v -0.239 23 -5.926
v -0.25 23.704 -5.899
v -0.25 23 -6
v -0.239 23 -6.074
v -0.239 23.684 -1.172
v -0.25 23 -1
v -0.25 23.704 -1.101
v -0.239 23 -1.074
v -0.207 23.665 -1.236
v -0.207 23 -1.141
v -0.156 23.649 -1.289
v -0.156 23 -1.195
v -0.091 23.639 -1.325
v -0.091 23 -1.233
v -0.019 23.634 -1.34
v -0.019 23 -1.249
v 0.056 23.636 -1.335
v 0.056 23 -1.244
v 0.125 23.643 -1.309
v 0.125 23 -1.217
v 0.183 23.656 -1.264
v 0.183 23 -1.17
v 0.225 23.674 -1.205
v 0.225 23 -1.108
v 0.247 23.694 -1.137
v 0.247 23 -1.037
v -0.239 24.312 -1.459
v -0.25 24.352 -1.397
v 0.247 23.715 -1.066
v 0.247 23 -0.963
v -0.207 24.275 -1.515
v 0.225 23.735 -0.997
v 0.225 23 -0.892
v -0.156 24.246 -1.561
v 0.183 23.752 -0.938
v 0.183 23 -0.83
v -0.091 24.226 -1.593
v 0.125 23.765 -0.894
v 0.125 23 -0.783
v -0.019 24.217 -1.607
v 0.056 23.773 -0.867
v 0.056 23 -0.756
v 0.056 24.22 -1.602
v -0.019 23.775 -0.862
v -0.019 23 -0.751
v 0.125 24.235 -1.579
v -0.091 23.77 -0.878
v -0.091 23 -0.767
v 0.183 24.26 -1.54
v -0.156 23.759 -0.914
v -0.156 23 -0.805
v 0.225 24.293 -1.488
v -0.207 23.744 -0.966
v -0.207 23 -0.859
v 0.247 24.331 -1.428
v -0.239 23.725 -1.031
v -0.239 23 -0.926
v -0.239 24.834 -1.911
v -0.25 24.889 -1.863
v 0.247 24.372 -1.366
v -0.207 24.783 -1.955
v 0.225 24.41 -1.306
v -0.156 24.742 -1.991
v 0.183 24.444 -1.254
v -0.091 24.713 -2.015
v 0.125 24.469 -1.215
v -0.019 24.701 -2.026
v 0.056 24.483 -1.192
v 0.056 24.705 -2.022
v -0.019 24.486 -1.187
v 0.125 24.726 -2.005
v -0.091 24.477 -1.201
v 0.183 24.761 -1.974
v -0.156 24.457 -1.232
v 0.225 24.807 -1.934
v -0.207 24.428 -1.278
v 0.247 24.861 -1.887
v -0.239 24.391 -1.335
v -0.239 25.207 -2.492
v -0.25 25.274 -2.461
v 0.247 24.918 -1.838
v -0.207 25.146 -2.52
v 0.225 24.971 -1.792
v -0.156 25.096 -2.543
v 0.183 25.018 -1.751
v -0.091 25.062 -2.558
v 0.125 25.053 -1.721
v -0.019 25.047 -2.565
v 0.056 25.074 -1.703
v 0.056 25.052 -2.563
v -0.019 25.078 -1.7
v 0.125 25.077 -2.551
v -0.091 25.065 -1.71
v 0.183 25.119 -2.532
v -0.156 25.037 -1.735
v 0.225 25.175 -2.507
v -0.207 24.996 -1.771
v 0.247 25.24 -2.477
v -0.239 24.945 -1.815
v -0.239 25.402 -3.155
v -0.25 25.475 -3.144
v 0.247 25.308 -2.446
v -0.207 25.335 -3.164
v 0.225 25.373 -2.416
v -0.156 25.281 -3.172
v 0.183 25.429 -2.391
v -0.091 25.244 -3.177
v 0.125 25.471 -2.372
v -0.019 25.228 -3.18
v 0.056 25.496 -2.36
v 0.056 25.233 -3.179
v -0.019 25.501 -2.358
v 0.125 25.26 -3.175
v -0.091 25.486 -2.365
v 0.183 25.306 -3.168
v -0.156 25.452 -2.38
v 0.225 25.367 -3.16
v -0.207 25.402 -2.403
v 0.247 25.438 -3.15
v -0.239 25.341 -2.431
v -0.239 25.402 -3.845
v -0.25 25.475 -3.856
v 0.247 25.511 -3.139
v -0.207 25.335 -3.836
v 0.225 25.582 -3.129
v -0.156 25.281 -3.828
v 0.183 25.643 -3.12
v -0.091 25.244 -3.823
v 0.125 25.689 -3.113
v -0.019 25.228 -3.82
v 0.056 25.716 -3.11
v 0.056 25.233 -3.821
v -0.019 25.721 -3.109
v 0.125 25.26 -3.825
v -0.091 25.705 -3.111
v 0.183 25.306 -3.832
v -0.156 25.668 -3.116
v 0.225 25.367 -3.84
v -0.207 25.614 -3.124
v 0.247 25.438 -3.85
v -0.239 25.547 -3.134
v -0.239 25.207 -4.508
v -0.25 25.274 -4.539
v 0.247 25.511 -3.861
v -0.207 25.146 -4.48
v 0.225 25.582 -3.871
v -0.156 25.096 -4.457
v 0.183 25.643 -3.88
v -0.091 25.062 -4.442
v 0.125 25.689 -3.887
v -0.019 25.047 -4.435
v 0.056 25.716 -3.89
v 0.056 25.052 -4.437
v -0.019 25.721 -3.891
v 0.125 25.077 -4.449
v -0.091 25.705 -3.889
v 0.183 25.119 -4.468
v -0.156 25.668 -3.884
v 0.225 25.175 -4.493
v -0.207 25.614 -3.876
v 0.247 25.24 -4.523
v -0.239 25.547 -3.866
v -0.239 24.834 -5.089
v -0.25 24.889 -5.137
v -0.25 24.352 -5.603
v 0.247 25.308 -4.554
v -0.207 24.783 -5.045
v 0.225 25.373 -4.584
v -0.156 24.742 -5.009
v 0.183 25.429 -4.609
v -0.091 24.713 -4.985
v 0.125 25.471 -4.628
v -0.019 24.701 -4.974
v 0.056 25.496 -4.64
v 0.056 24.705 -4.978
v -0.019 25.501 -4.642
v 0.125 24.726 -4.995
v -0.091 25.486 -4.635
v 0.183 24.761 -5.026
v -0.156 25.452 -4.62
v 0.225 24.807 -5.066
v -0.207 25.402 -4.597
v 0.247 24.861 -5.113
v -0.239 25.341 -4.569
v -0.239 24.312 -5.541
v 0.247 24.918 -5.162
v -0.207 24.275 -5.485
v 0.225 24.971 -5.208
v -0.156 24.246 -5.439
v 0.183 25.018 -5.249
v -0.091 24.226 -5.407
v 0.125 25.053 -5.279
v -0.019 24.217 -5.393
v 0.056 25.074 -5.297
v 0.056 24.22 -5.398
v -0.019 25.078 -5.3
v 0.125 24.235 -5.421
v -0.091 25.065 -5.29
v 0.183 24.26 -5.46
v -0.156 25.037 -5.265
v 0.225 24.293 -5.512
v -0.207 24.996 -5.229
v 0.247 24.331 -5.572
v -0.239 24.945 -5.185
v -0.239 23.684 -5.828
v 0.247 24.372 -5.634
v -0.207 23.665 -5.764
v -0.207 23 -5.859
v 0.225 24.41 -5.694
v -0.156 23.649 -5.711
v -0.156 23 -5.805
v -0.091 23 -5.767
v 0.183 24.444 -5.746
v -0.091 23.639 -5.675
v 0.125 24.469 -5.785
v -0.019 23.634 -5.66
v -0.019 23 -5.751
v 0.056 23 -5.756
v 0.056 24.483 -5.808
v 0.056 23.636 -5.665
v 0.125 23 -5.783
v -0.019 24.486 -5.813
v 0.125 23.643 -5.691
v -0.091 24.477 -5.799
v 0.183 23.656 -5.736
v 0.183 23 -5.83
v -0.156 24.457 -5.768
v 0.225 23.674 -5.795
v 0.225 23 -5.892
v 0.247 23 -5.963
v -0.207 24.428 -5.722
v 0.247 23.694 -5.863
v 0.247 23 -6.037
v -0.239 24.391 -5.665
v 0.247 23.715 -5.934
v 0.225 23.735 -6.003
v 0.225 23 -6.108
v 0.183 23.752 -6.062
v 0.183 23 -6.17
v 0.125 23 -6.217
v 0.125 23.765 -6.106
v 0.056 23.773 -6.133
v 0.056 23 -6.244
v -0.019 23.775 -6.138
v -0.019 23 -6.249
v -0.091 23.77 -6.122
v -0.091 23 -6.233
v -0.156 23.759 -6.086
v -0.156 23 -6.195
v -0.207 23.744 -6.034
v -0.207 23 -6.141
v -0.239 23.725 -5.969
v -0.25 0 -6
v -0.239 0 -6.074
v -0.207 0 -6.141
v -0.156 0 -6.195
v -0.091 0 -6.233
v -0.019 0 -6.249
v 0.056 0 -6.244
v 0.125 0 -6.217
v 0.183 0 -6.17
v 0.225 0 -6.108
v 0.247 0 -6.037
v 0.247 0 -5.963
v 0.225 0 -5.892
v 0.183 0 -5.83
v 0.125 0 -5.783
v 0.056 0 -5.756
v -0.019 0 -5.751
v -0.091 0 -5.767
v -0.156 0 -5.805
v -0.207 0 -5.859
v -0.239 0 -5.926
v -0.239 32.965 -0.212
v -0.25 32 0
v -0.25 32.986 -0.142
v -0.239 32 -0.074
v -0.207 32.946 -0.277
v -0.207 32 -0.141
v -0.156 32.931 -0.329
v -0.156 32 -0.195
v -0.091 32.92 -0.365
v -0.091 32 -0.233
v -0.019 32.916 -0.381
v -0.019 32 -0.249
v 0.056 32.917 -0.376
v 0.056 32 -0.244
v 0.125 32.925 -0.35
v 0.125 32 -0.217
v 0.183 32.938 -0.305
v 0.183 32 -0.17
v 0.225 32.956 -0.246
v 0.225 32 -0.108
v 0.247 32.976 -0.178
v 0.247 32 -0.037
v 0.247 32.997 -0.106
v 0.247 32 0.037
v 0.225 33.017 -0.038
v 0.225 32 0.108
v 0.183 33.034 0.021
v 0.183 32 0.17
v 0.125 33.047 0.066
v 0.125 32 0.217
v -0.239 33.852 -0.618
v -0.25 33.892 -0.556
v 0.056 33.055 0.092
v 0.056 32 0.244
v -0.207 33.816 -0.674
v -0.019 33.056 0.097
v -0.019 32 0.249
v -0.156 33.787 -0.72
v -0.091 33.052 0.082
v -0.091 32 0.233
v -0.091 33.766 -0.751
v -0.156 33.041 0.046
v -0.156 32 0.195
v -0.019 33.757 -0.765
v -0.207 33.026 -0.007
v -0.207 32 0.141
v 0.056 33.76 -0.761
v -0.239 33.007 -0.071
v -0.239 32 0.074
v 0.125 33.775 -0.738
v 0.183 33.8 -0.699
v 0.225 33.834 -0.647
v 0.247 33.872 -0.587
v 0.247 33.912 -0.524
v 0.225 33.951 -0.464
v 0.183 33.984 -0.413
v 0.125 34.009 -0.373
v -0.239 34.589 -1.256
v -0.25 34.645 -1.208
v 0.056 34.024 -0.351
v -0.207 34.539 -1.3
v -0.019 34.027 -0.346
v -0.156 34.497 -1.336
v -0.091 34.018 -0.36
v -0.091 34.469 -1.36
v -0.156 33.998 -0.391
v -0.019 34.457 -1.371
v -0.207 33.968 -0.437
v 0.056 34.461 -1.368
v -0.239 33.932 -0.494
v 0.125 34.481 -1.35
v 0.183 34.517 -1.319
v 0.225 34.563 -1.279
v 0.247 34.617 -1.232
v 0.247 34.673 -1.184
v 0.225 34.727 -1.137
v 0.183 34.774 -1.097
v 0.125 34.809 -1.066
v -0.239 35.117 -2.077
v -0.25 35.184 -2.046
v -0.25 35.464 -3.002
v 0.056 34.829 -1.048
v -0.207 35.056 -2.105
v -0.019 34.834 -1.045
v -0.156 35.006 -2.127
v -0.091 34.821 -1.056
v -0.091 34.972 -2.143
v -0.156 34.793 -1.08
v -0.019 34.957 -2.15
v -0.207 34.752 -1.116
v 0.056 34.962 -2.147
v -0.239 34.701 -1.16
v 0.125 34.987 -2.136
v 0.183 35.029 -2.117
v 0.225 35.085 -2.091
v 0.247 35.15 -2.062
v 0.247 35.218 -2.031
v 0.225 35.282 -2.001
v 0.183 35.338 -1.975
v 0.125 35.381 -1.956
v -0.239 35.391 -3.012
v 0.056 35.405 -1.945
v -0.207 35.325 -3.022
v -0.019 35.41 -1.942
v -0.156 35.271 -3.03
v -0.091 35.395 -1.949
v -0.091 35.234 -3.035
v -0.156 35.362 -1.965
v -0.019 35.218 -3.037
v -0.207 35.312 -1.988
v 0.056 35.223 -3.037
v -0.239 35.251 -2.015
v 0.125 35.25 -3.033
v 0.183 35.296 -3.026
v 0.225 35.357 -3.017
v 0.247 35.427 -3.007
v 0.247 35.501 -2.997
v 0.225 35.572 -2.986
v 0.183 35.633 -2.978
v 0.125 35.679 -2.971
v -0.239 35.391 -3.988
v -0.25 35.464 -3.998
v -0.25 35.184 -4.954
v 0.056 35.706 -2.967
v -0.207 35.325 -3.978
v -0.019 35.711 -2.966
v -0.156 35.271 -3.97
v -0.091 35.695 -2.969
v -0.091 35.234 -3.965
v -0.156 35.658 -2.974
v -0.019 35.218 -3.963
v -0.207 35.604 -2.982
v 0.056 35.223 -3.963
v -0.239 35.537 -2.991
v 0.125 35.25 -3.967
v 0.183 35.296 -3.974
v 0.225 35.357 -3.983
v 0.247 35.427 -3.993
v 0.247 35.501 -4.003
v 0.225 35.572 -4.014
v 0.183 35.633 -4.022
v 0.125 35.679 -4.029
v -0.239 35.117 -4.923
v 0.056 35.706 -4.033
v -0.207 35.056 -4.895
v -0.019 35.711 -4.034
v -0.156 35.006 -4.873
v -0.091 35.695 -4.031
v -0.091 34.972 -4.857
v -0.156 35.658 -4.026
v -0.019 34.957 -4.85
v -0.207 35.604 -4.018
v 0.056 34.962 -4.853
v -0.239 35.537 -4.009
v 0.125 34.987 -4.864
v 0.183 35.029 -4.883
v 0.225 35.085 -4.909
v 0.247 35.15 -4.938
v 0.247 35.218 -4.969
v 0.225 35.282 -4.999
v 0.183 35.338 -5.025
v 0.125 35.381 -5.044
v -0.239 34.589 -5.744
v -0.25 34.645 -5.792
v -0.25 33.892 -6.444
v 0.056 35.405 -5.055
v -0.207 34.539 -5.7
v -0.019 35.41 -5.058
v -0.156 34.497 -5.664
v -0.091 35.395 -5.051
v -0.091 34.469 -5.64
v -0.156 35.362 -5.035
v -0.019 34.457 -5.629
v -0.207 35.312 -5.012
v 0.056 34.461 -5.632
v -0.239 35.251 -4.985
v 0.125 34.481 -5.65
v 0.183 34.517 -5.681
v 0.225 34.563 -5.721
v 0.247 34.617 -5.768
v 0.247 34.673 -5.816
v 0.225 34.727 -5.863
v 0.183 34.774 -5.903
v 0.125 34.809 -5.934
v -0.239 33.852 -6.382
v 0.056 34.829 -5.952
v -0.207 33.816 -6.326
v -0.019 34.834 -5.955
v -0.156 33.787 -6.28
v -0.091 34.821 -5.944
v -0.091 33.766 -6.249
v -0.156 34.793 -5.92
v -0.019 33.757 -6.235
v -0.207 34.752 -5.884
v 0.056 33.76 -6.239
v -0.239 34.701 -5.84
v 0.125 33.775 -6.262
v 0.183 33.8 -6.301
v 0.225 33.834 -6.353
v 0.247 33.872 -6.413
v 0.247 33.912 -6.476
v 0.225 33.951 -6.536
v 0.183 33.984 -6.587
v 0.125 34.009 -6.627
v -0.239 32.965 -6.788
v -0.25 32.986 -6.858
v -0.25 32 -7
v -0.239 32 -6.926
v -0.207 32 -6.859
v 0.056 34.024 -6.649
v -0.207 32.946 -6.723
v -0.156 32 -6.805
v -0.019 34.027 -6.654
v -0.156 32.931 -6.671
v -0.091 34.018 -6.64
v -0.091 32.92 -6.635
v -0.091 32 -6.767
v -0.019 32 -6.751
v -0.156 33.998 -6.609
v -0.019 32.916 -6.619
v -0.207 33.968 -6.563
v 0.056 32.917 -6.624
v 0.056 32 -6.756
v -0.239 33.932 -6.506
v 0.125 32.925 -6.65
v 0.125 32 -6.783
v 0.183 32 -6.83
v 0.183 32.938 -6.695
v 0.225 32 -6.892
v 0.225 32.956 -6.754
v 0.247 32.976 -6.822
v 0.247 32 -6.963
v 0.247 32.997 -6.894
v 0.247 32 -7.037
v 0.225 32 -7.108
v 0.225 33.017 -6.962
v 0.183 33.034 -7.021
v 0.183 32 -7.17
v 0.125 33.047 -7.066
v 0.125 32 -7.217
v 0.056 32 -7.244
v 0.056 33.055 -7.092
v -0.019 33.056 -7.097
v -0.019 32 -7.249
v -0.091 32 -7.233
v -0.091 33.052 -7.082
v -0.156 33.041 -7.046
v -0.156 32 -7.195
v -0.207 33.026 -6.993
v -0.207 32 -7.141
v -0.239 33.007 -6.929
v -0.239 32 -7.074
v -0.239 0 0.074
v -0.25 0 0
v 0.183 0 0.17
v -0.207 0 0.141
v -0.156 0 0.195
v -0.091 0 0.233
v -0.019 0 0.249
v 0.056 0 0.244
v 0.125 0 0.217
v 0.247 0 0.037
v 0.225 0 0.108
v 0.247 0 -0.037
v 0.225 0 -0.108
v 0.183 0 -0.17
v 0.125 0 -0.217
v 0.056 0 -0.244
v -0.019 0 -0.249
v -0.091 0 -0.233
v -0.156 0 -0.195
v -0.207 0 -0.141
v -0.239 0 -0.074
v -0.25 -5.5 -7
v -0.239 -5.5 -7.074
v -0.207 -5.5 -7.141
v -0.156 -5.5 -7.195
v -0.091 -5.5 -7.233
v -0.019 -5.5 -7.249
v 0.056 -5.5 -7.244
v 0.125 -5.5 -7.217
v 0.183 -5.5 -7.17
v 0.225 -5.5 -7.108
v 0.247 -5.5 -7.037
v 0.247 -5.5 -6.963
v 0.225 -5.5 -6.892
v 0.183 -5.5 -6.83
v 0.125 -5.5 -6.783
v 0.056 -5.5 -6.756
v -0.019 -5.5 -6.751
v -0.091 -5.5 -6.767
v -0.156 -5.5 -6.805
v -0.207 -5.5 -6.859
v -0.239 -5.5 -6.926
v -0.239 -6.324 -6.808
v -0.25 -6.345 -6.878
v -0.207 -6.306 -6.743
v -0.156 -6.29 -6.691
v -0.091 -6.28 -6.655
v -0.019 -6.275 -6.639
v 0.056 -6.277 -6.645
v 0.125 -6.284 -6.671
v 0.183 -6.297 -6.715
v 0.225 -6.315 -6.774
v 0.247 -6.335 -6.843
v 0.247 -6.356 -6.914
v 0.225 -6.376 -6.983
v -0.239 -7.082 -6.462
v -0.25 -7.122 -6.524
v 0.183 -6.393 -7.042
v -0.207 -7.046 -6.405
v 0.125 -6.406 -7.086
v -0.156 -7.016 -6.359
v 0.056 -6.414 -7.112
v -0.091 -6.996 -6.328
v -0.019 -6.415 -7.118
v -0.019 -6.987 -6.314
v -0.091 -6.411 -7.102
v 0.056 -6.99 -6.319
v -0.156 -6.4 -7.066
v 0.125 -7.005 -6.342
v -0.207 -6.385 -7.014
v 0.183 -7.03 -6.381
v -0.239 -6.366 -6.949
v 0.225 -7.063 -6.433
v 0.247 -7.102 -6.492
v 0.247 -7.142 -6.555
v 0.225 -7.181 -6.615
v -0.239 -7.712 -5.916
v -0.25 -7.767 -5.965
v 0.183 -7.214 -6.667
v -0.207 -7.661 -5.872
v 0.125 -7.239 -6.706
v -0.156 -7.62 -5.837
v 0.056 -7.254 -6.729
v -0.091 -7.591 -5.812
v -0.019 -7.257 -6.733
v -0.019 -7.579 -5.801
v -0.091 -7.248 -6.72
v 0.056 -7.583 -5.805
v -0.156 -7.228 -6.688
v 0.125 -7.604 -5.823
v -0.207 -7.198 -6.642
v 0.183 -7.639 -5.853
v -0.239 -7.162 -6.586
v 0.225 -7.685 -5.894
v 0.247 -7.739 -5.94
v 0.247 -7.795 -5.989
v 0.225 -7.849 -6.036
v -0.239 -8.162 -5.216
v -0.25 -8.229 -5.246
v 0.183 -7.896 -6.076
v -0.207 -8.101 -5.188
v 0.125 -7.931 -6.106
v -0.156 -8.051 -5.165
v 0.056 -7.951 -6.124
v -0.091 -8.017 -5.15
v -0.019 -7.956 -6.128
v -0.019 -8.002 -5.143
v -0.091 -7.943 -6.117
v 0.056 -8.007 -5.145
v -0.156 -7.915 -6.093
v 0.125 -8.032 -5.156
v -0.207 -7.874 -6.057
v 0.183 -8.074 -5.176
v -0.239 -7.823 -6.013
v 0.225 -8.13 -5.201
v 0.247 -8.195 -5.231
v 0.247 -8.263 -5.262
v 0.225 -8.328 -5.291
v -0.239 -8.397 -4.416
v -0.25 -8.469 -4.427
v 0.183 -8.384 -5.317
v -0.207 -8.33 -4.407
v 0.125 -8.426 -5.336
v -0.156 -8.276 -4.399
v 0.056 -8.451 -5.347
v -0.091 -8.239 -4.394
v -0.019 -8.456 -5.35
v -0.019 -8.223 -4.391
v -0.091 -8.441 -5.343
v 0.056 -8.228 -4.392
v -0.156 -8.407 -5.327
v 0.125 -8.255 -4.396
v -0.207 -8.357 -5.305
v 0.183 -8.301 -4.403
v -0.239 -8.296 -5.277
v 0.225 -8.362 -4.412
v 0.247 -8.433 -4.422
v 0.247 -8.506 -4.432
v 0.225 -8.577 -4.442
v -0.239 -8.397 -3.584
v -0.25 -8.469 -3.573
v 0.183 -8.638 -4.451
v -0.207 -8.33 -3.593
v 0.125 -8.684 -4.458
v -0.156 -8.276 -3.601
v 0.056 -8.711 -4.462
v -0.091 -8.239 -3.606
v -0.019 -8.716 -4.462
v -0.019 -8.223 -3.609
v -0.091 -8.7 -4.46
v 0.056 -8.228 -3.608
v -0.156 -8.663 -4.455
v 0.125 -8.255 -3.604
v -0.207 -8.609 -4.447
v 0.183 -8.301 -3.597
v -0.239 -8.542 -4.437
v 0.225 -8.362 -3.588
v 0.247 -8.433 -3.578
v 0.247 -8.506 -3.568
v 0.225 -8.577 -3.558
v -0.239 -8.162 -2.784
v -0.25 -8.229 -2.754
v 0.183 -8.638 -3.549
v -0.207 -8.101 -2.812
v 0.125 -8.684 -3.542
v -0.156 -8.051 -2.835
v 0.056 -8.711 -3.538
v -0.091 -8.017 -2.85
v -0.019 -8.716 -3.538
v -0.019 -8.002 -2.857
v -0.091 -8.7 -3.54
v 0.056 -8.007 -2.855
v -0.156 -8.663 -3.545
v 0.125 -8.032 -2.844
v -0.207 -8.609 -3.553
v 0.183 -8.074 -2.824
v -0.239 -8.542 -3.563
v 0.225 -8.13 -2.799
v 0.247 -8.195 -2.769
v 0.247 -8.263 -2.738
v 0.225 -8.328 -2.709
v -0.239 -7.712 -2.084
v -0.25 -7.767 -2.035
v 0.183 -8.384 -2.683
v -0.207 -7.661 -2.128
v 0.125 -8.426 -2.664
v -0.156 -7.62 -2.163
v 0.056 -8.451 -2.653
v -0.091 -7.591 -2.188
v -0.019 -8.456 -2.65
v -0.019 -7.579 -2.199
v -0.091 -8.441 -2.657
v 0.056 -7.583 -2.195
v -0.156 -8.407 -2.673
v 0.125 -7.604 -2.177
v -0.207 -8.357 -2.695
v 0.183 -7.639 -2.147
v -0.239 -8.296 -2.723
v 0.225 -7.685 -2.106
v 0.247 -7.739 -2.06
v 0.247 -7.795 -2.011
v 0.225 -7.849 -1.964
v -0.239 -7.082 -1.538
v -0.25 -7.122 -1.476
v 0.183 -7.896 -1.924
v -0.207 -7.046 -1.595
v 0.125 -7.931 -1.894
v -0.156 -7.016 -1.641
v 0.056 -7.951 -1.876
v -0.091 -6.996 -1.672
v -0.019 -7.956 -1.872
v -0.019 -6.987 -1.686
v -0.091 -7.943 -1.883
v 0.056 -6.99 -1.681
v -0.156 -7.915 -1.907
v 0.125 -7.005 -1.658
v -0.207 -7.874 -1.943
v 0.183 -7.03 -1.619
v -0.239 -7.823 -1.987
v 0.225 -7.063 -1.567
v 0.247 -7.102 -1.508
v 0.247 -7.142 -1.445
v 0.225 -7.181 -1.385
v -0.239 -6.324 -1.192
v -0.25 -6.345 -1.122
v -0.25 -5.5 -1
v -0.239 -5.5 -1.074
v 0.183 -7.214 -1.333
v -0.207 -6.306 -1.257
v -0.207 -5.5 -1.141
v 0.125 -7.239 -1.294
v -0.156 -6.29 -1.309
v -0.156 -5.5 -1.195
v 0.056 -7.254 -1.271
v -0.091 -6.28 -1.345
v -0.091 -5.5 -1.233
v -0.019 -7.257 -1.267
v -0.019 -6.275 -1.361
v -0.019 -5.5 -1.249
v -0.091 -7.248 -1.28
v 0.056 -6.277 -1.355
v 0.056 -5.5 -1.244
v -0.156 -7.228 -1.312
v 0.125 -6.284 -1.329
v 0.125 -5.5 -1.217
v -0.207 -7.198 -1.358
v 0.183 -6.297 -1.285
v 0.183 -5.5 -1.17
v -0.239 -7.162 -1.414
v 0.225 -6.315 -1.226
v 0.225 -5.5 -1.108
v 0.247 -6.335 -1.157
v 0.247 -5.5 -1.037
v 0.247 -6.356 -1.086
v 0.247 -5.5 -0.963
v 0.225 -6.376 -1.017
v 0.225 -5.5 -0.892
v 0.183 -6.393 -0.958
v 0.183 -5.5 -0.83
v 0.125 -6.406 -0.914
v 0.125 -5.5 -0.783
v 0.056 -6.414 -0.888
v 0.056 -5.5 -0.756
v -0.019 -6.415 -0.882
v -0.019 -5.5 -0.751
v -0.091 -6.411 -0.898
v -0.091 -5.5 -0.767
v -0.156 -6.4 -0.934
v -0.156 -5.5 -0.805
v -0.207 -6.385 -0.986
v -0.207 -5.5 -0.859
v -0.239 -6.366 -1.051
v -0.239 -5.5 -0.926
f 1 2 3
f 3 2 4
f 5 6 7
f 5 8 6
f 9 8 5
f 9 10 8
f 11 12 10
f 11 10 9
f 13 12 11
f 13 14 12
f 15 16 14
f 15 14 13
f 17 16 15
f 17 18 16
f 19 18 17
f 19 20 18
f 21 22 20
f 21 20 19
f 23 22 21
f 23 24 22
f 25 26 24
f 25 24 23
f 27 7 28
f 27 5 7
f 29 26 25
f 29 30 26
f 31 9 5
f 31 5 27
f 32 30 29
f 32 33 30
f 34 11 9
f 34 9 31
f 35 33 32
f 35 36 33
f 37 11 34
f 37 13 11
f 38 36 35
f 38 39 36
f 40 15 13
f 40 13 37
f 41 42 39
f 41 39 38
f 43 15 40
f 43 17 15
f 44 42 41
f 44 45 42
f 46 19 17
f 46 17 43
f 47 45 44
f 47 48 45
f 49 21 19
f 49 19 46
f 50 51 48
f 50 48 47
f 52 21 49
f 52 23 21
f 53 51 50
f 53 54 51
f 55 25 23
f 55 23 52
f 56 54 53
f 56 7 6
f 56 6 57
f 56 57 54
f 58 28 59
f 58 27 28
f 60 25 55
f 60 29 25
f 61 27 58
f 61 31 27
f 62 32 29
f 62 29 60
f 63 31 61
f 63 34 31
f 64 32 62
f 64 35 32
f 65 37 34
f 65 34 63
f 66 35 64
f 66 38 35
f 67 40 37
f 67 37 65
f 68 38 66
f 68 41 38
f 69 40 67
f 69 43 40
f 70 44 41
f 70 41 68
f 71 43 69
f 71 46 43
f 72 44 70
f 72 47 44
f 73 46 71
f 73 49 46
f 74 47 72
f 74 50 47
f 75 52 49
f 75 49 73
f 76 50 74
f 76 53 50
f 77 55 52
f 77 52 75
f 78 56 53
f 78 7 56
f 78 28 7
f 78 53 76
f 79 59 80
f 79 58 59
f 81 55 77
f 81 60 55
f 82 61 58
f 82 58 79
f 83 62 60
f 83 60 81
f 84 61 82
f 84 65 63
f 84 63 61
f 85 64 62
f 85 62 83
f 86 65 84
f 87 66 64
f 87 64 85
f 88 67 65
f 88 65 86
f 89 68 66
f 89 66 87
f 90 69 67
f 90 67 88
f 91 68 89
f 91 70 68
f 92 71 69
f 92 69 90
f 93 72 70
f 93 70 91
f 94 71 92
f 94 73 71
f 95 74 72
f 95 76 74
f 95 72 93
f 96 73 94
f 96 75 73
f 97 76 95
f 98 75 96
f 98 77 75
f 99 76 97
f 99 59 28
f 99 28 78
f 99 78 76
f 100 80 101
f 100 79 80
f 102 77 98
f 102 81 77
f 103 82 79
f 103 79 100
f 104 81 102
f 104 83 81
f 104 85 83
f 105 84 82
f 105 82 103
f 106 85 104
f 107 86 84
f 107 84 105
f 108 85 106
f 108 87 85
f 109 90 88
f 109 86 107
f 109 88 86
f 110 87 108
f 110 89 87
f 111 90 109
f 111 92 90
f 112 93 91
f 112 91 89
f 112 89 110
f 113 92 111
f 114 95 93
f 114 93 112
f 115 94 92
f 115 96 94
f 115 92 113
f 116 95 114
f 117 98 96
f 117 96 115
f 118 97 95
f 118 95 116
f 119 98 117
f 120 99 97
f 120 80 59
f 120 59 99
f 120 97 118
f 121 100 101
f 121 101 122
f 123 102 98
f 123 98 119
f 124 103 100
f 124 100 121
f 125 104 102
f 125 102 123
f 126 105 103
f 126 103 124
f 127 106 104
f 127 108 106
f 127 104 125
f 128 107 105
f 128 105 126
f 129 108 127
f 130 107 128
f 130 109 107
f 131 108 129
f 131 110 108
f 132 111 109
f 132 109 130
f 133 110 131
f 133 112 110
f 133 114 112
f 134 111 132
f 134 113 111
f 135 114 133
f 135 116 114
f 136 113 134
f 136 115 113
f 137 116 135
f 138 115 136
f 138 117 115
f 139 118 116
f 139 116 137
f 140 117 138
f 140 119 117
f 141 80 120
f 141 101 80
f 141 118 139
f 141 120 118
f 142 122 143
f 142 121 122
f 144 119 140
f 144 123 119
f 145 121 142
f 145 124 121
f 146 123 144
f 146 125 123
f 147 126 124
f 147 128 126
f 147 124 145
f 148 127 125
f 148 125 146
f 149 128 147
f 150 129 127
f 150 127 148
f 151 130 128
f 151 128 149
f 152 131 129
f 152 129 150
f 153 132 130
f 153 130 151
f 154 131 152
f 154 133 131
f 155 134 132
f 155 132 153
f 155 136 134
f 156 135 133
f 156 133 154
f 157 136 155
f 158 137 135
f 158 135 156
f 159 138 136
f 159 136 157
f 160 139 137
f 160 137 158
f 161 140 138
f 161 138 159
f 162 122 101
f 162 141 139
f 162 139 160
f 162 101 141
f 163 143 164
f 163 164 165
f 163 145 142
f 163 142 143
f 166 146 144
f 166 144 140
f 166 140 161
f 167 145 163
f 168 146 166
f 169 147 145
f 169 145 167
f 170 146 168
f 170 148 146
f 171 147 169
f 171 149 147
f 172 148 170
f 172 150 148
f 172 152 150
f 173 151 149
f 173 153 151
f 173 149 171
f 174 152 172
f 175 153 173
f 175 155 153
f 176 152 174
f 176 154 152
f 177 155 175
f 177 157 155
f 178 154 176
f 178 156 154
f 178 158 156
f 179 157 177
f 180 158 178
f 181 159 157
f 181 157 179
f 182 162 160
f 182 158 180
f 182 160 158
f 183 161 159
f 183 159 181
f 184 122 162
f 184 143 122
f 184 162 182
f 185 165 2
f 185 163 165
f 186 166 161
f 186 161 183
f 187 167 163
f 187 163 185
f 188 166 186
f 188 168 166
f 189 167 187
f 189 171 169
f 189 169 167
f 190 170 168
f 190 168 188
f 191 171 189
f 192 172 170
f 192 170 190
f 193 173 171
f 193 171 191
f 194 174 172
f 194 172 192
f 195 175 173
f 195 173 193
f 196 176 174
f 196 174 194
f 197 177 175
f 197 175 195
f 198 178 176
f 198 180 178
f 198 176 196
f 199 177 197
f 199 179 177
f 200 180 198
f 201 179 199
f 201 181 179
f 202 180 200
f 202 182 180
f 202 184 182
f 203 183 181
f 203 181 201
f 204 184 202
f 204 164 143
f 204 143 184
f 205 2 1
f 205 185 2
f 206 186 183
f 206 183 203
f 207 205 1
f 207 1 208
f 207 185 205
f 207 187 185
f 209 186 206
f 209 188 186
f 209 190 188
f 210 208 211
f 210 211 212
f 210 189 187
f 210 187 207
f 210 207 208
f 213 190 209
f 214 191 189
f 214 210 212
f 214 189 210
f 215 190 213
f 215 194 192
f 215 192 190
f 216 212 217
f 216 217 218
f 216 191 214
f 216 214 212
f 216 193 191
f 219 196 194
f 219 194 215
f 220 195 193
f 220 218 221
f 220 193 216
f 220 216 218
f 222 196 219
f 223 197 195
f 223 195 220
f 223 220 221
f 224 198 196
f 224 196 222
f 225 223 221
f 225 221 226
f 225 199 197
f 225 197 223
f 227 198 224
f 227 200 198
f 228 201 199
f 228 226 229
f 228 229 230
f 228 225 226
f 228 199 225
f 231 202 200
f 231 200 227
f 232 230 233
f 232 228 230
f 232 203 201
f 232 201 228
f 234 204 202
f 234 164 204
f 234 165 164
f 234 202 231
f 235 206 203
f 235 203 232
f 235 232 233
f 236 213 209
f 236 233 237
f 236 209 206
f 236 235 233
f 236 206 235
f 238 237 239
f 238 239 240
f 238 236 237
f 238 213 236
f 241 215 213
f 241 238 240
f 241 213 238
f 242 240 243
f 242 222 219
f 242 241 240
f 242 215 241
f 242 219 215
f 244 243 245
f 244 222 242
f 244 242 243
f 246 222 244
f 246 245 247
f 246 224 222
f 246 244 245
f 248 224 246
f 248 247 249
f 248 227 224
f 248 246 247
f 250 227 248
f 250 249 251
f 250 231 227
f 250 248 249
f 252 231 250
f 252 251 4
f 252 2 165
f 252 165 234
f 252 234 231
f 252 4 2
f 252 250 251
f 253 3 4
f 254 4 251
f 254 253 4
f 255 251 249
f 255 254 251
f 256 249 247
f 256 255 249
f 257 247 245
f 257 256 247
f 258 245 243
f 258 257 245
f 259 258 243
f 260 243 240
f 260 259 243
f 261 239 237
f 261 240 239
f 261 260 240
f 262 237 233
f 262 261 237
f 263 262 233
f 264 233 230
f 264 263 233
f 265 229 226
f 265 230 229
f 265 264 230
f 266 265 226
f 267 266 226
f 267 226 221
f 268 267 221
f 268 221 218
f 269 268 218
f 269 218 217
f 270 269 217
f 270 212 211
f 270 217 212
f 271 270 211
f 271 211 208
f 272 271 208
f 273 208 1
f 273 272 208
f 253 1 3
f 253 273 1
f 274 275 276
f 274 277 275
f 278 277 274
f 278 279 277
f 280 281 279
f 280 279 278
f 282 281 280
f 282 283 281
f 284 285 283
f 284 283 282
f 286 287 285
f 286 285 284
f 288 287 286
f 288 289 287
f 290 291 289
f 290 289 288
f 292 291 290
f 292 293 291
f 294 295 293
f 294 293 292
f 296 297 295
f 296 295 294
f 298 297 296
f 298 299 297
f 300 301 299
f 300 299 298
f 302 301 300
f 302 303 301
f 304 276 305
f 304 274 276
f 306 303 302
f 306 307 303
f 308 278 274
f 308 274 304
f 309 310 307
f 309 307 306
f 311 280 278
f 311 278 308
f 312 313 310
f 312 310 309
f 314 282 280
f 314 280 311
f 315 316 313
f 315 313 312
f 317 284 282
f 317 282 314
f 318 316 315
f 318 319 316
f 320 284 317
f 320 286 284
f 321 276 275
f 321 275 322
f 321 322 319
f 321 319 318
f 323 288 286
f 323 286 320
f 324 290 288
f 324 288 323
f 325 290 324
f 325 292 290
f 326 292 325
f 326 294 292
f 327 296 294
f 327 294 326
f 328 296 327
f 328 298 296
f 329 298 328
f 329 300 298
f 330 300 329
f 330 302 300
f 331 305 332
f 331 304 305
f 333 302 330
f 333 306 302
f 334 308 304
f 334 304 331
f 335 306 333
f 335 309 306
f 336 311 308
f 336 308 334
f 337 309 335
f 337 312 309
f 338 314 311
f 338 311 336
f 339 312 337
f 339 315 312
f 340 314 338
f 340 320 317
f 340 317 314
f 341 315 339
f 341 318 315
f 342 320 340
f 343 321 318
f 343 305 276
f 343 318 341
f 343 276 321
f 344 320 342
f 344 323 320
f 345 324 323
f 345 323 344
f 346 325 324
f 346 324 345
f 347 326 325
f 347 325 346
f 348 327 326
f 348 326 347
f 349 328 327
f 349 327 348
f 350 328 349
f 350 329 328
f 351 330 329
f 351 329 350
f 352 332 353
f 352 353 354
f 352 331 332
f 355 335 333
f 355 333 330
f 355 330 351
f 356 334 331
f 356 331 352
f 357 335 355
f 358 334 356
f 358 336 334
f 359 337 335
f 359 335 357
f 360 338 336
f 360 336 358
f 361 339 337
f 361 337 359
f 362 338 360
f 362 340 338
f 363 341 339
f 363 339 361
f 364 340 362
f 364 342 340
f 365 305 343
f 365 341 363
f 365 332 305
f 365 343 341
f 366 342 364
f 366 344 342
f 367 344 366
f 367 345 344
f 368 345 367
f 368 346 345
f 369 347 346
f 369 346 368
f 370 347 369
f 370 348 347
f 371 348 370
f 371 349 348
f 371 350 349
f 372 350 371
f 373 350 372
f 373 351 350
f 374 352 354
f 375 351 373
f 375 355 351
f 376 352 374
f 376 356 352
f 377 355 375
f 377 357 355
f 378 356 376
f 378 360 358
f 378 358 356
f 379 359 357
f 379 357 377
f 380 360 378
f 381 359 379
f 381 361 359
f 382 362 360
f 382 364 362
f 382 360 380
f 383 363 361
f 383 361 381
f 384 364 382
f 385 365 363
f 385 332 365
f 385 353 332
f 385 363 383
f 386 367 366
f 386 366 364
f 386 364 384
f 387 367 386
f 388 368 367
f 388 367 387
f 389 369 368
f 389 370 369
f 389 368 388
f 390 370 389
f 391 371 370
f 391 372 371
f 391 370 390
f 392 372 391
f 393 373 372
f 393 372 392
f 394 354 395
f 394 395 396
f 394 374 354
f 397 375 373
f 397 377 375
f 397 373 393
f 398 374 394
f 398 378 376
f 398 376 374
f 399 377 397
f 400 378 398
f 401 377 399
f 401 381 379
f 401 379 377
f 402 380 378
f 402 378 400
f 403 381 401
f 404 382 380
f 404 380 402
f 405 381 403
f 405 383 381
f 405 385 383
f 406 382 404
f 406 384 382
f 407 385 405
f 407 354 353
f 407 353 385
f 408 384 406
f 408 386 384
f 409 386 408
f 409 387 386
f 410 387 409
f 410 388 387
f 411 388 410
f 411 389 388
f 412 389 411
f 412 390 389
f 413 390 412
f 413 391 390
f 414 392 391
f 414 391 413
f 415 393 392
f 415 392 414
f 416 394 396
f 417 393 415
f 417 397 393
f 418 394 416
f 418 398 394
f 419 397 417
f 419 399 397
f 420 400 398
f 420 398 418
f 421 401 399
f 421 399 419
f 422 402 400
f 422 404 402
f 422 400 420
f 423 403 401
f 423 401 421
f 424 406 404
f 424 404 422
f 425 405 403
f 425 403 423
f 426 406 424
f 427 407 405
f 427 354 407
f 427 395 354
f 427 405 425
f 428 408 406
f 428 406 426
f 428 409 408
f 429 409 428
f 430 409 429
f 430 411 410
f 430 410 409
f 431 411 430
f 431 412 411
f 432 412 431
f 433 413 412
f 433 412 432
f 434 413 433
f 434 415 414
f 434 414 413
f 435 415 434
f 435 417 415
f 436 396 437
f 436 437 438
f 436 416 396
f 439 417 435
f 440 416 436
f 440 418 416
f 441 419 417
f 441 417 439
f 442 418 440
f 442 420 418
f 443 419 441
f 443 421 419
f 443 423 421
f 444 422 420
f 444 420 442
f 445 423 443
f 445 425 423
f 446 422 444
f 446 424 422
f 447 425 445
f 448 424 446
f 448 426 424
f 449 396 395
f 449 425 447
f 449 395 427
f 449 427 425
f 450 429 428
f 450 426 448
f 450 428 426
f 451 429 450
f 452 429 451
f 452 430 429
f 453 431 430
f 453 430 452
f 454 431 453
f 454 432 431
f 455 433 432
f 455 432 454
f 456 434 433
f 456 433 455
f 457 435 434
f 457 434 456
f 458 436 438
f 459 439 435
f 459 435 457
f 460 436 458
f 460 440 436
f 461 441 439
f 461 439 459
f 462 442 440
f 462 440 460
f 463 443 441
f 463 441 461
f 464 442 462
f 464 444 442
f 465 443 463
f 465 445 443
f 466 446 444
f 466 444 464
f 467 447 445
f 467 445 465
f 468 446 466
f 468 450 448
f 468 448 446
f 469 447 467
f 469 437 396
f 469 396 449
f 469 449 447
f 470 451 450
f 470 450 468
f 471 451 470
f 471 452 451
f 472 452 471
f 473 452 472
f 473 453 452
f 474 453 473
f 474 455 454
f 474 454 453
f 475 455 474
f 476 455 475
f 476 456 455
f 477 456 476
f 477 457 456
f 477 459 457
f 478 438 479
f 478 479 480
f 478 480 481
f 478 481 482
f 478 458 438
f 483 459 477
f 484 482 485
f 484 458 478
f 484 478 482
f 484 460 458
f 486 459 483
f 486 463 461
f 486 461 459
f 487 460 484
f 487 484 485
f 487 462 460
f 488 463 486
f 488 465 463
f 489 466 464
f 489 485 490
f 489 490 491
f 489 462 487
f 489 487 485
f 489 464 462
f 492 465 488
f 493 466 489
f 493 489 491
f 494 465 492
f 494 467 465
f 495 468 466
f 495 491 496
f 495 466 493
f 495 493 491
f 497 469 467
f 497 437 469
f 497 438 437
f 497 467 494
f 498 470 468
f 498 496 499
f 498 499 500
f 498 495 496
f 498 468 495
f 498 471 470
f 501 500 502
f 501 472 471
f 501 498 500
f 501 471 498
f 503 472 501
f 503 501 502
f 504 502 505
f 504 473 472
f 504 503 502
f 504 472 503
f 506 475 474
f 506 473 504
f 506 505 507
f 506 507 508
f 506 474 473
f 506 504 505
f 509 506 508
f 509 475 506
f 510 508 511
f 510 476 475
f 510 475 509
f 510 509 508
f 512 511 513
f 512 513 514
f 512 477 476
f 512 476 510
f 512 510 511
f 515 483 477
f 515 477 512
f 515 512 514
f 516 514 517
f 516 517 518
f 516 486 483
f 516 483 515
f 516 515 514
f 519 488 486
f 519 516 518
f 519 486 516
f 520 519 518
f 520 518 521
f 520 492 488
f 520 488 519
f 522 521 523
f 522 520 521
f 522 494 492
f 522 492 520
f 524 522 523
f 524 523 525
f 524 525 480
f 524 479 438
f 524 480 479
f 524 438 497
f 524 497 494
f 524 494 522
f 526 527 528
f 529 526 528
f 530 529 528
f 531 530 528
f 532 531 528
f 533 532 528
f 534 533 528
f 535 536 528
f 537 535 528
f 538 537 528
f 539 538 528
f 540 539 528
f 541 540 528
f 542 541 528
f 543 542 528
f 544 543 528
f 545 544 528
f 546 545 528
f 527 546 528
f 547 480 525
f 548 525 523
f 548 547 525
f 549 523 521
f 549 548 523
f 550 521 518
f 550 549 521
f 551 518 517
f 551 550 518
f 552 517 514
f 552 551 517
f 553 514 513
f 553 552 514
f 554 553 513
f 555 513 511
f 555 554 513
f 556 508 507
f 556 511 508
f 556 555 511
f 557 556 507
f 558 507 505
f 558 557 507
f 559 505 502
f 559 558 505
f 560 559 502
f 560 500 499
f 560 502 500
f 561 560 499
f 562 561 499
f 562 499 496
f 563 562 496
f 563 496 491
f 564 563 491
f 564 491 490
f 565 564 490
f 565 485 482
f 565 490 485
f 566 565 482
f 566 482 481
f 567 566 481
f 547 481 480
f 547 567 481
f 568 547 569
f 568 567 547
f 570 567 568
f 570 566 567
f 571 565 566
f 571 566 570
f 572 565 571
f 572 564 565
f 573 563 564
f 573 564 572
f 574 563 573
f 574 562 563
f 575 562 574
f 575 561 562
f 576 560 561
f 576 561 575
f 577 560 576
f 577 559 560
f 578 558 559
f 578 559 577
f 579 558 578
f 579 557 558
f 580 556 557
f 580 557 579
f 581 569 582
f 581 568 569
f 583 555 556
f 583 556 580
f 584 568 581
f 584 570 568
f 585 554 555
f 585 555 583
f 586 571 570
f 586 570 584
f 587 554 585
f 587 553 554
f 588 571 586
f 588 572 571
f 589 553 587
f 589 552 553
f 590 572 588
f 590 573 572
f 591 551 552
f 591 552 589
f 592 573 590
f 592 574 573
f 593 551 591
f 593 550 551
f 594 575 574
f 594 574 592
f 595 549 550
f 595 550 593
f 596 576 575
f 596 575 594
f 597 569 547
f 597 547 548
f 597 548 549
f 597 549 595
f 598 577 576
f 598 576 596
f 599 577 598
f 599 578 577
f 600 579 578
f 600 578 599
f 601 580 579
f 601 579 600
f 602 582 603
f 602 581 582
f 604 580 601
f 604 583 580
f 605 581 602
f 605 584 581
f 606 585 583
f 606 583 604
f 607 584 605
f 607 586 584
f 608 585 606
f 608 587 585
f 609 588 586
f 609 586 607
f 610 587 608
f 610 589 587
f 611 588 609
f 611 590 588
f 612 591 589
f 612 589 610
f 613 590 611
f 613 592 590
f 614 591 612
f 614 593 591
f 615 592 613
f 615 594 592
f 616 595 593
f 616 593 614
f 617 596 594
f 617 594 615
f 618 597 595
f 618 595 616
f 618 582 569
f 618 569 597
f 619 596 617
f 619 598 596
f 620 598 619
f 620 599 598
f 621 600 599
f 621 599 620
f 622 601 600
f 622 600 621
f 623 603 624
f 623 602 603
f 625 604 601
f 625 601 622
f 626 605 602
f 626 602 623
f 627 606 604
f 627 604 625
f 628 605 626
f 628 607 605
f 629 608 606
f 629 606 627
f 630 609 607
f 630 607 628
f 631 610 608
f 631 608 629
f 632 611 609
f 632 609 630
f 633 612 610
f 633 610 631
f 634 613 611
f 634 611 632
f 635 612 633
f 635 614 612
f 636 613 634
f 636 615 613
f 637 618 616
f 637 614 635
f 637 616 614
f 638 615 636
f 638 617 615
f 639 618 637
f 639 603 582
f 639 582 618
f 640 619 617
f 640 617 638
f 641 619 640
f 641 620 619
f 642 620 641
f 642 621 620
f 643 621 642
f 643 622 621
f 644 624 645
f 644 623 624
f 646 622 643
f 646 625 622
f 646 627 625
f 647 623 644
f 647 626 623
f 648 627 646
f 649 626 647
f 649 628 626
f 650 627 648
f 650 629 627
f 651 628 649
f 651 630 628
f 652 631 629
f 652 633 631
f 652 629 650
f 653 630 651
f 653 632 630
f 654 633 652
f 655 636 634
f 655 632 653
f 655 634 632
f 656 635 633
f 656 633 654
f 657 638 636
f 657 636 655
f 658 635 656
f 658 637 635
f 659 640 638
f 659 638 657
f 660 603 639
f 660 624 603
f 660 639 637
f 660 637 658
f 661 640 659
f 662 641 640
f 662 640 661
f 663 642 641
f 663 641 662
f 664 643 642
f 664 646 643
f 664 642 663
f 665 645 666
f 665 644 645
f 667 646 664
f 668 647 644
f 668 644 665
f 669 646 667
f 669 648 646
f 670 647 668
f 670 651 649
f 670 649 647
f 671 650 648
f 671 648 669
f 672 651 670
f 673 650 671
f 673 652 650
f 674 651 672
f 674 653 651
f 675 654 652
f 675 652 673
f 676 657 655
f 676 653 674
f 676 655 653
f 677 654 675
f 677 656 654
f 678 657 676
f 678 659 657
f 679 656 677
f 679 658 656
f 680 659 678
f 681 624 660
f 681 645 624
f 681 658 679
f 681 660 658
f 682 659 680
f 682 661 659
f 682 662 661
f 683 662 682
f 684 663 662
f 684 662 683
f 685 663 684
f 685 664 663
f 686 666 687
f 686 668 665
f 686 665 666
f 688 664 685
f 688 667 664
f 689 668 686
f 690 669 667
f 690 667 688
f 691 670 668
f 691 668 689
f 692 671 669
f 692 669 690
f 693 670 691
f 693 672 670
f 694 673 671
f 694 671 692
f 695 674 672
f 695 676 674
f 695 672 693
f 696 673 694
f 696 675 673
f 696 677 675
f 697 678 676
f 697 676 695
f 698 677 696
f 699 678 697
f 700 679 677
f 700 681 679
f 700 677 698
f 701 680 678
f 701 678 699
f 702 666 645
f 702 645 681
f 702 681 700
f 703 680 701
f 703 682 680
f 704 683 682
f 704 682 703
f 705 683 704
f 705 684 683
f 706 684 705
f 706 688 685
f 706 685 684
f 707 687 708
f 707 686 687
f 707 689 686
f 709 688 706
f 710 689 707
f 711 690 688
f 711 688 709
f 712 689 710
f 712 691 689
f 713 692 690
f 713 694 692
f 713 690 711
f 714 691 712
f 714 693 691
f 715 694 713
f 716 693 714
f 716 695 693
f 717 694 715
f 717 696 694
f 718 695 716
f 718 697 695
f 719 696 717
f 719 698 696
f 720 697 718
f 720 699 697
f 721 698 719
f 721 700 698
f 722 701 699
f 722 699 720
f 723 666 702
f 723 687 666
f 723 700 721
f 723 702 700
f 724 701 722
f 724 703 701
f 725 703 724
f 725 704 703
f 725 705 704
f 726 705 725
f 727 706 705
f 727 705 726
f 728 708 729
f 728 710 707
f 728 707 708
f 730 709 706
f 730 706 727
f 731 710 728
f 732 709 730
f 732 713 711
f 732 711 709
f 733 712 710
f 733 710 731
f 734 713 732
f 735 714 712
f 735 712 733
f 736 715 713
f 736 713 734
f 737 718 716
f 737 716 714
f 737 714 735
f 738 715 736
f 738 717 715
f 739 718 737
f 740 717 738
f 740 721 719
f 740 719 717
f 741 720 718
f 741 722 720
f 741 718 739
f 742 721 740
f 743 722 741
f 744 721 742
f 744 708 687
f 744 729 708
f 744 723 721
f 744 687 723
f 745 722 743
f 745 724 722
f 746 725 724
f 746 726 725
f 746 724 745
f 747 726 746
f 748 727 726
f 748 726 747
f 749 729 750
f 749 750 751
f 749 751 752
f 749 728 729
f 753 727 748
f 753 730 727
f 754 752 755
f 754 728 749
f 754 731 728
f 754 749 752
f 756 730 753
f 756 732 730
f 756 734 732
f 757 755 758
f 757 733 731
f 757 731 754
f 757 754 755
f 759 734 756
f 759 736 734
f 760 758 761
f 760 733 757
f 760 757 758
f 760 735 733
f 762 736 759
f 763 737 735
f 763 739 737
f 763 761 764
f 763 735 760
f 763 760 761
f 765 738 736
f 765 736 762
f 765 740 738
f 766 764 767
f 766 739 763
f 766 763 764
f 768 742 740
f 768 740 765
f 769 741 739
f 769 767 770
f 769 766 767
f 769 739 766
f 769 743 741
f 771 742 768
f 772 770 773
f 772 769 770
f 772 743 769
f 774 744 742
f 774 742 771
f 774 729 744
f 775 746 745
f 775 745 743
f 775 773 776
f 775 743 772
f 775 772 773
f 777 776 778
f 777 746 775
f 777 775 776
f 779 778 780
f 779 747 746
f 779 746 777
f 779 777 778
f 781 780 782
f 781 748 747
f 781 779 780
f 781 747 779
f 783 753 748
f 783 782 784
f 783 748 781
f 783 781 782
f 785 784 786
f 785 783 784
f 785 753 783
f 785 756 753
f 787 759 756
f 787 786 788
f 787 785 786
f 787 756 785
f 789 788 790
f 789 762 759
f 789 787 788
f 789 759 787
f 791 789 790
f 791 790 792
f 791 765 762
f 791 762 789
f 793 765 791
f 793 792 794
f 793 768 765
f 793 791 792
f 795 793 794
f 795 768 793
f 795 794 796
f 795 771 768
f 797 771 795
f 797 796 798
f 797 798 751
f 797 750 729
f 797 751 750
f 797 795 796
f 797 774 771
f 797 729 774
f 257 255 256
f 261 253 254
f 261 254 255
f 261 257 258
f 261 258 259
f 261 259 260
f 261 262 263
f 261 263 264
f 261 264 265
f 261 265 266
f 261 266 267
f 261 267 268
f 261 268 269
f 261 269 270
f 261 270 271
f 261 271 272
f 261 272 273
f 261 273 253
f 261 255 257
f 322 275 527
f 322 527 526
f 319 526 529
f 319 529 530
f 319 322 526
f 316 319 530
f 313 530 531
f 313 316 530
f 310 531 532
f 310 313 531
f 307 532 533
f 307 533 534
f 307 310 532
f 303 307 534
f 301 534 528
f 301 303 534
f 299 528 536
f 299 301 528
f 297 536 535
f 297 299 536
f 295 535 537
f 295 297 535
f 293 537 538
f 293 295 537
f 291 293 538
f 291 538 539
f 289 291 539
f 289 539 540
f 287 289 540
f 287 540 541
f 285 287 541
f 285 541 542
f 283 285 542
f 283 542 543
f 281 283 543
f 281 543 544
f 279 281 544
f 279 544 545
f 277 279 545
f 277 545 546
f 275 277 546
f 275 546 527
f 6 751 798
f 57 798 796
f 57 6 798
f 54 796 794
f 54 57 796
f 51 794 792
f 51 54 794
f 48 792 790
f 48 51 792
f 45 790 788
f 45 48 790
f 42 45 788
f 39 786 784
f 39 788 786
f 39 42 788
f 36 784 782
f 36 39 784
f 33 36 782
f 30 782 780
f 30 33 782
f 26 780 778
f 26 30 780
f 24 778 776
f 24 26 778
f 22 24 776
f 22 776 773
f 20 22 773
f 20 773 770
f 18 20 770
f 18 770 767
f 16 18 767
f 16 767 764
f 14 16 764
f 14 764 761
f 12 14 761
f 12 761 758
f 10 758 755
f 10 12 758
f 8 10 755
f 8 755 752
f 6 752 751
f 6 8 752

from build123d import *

# Parameters (mm, degrees)
SKETCH2_R = 0.25


with BuildPart() as part:
    # Sweep1: sweep along a path in Sketch1
    with BuildLine(Plane.YZ) as sweep1_path:
        Line((0, 0), (32, 0))
        ThreePointArc((32, 0), (35.5, -3.5), (32, -7))
        Line((32, -7), (-5.5, -7))
        ThreePointArc((-5.5, -7), (-8.5, -4), (-5.5, -1))
        Line((-5.5, -1), (23, -1))
        ThreePointArc((23, -1), (25.5, -3.5), (23, -6))
        Line((23, -6), (0, -6))
    # Sketch2 → Sweep1 (sweep)
    with BuildSketch(Plane(origin=(0, 0, 0), x_dir=(-1, 0, 0), z_dir=(0, 1, 0))):
        Circle(SKETCH2_R)
    sweep(path=sweep1_path.line)


solid = part.part
